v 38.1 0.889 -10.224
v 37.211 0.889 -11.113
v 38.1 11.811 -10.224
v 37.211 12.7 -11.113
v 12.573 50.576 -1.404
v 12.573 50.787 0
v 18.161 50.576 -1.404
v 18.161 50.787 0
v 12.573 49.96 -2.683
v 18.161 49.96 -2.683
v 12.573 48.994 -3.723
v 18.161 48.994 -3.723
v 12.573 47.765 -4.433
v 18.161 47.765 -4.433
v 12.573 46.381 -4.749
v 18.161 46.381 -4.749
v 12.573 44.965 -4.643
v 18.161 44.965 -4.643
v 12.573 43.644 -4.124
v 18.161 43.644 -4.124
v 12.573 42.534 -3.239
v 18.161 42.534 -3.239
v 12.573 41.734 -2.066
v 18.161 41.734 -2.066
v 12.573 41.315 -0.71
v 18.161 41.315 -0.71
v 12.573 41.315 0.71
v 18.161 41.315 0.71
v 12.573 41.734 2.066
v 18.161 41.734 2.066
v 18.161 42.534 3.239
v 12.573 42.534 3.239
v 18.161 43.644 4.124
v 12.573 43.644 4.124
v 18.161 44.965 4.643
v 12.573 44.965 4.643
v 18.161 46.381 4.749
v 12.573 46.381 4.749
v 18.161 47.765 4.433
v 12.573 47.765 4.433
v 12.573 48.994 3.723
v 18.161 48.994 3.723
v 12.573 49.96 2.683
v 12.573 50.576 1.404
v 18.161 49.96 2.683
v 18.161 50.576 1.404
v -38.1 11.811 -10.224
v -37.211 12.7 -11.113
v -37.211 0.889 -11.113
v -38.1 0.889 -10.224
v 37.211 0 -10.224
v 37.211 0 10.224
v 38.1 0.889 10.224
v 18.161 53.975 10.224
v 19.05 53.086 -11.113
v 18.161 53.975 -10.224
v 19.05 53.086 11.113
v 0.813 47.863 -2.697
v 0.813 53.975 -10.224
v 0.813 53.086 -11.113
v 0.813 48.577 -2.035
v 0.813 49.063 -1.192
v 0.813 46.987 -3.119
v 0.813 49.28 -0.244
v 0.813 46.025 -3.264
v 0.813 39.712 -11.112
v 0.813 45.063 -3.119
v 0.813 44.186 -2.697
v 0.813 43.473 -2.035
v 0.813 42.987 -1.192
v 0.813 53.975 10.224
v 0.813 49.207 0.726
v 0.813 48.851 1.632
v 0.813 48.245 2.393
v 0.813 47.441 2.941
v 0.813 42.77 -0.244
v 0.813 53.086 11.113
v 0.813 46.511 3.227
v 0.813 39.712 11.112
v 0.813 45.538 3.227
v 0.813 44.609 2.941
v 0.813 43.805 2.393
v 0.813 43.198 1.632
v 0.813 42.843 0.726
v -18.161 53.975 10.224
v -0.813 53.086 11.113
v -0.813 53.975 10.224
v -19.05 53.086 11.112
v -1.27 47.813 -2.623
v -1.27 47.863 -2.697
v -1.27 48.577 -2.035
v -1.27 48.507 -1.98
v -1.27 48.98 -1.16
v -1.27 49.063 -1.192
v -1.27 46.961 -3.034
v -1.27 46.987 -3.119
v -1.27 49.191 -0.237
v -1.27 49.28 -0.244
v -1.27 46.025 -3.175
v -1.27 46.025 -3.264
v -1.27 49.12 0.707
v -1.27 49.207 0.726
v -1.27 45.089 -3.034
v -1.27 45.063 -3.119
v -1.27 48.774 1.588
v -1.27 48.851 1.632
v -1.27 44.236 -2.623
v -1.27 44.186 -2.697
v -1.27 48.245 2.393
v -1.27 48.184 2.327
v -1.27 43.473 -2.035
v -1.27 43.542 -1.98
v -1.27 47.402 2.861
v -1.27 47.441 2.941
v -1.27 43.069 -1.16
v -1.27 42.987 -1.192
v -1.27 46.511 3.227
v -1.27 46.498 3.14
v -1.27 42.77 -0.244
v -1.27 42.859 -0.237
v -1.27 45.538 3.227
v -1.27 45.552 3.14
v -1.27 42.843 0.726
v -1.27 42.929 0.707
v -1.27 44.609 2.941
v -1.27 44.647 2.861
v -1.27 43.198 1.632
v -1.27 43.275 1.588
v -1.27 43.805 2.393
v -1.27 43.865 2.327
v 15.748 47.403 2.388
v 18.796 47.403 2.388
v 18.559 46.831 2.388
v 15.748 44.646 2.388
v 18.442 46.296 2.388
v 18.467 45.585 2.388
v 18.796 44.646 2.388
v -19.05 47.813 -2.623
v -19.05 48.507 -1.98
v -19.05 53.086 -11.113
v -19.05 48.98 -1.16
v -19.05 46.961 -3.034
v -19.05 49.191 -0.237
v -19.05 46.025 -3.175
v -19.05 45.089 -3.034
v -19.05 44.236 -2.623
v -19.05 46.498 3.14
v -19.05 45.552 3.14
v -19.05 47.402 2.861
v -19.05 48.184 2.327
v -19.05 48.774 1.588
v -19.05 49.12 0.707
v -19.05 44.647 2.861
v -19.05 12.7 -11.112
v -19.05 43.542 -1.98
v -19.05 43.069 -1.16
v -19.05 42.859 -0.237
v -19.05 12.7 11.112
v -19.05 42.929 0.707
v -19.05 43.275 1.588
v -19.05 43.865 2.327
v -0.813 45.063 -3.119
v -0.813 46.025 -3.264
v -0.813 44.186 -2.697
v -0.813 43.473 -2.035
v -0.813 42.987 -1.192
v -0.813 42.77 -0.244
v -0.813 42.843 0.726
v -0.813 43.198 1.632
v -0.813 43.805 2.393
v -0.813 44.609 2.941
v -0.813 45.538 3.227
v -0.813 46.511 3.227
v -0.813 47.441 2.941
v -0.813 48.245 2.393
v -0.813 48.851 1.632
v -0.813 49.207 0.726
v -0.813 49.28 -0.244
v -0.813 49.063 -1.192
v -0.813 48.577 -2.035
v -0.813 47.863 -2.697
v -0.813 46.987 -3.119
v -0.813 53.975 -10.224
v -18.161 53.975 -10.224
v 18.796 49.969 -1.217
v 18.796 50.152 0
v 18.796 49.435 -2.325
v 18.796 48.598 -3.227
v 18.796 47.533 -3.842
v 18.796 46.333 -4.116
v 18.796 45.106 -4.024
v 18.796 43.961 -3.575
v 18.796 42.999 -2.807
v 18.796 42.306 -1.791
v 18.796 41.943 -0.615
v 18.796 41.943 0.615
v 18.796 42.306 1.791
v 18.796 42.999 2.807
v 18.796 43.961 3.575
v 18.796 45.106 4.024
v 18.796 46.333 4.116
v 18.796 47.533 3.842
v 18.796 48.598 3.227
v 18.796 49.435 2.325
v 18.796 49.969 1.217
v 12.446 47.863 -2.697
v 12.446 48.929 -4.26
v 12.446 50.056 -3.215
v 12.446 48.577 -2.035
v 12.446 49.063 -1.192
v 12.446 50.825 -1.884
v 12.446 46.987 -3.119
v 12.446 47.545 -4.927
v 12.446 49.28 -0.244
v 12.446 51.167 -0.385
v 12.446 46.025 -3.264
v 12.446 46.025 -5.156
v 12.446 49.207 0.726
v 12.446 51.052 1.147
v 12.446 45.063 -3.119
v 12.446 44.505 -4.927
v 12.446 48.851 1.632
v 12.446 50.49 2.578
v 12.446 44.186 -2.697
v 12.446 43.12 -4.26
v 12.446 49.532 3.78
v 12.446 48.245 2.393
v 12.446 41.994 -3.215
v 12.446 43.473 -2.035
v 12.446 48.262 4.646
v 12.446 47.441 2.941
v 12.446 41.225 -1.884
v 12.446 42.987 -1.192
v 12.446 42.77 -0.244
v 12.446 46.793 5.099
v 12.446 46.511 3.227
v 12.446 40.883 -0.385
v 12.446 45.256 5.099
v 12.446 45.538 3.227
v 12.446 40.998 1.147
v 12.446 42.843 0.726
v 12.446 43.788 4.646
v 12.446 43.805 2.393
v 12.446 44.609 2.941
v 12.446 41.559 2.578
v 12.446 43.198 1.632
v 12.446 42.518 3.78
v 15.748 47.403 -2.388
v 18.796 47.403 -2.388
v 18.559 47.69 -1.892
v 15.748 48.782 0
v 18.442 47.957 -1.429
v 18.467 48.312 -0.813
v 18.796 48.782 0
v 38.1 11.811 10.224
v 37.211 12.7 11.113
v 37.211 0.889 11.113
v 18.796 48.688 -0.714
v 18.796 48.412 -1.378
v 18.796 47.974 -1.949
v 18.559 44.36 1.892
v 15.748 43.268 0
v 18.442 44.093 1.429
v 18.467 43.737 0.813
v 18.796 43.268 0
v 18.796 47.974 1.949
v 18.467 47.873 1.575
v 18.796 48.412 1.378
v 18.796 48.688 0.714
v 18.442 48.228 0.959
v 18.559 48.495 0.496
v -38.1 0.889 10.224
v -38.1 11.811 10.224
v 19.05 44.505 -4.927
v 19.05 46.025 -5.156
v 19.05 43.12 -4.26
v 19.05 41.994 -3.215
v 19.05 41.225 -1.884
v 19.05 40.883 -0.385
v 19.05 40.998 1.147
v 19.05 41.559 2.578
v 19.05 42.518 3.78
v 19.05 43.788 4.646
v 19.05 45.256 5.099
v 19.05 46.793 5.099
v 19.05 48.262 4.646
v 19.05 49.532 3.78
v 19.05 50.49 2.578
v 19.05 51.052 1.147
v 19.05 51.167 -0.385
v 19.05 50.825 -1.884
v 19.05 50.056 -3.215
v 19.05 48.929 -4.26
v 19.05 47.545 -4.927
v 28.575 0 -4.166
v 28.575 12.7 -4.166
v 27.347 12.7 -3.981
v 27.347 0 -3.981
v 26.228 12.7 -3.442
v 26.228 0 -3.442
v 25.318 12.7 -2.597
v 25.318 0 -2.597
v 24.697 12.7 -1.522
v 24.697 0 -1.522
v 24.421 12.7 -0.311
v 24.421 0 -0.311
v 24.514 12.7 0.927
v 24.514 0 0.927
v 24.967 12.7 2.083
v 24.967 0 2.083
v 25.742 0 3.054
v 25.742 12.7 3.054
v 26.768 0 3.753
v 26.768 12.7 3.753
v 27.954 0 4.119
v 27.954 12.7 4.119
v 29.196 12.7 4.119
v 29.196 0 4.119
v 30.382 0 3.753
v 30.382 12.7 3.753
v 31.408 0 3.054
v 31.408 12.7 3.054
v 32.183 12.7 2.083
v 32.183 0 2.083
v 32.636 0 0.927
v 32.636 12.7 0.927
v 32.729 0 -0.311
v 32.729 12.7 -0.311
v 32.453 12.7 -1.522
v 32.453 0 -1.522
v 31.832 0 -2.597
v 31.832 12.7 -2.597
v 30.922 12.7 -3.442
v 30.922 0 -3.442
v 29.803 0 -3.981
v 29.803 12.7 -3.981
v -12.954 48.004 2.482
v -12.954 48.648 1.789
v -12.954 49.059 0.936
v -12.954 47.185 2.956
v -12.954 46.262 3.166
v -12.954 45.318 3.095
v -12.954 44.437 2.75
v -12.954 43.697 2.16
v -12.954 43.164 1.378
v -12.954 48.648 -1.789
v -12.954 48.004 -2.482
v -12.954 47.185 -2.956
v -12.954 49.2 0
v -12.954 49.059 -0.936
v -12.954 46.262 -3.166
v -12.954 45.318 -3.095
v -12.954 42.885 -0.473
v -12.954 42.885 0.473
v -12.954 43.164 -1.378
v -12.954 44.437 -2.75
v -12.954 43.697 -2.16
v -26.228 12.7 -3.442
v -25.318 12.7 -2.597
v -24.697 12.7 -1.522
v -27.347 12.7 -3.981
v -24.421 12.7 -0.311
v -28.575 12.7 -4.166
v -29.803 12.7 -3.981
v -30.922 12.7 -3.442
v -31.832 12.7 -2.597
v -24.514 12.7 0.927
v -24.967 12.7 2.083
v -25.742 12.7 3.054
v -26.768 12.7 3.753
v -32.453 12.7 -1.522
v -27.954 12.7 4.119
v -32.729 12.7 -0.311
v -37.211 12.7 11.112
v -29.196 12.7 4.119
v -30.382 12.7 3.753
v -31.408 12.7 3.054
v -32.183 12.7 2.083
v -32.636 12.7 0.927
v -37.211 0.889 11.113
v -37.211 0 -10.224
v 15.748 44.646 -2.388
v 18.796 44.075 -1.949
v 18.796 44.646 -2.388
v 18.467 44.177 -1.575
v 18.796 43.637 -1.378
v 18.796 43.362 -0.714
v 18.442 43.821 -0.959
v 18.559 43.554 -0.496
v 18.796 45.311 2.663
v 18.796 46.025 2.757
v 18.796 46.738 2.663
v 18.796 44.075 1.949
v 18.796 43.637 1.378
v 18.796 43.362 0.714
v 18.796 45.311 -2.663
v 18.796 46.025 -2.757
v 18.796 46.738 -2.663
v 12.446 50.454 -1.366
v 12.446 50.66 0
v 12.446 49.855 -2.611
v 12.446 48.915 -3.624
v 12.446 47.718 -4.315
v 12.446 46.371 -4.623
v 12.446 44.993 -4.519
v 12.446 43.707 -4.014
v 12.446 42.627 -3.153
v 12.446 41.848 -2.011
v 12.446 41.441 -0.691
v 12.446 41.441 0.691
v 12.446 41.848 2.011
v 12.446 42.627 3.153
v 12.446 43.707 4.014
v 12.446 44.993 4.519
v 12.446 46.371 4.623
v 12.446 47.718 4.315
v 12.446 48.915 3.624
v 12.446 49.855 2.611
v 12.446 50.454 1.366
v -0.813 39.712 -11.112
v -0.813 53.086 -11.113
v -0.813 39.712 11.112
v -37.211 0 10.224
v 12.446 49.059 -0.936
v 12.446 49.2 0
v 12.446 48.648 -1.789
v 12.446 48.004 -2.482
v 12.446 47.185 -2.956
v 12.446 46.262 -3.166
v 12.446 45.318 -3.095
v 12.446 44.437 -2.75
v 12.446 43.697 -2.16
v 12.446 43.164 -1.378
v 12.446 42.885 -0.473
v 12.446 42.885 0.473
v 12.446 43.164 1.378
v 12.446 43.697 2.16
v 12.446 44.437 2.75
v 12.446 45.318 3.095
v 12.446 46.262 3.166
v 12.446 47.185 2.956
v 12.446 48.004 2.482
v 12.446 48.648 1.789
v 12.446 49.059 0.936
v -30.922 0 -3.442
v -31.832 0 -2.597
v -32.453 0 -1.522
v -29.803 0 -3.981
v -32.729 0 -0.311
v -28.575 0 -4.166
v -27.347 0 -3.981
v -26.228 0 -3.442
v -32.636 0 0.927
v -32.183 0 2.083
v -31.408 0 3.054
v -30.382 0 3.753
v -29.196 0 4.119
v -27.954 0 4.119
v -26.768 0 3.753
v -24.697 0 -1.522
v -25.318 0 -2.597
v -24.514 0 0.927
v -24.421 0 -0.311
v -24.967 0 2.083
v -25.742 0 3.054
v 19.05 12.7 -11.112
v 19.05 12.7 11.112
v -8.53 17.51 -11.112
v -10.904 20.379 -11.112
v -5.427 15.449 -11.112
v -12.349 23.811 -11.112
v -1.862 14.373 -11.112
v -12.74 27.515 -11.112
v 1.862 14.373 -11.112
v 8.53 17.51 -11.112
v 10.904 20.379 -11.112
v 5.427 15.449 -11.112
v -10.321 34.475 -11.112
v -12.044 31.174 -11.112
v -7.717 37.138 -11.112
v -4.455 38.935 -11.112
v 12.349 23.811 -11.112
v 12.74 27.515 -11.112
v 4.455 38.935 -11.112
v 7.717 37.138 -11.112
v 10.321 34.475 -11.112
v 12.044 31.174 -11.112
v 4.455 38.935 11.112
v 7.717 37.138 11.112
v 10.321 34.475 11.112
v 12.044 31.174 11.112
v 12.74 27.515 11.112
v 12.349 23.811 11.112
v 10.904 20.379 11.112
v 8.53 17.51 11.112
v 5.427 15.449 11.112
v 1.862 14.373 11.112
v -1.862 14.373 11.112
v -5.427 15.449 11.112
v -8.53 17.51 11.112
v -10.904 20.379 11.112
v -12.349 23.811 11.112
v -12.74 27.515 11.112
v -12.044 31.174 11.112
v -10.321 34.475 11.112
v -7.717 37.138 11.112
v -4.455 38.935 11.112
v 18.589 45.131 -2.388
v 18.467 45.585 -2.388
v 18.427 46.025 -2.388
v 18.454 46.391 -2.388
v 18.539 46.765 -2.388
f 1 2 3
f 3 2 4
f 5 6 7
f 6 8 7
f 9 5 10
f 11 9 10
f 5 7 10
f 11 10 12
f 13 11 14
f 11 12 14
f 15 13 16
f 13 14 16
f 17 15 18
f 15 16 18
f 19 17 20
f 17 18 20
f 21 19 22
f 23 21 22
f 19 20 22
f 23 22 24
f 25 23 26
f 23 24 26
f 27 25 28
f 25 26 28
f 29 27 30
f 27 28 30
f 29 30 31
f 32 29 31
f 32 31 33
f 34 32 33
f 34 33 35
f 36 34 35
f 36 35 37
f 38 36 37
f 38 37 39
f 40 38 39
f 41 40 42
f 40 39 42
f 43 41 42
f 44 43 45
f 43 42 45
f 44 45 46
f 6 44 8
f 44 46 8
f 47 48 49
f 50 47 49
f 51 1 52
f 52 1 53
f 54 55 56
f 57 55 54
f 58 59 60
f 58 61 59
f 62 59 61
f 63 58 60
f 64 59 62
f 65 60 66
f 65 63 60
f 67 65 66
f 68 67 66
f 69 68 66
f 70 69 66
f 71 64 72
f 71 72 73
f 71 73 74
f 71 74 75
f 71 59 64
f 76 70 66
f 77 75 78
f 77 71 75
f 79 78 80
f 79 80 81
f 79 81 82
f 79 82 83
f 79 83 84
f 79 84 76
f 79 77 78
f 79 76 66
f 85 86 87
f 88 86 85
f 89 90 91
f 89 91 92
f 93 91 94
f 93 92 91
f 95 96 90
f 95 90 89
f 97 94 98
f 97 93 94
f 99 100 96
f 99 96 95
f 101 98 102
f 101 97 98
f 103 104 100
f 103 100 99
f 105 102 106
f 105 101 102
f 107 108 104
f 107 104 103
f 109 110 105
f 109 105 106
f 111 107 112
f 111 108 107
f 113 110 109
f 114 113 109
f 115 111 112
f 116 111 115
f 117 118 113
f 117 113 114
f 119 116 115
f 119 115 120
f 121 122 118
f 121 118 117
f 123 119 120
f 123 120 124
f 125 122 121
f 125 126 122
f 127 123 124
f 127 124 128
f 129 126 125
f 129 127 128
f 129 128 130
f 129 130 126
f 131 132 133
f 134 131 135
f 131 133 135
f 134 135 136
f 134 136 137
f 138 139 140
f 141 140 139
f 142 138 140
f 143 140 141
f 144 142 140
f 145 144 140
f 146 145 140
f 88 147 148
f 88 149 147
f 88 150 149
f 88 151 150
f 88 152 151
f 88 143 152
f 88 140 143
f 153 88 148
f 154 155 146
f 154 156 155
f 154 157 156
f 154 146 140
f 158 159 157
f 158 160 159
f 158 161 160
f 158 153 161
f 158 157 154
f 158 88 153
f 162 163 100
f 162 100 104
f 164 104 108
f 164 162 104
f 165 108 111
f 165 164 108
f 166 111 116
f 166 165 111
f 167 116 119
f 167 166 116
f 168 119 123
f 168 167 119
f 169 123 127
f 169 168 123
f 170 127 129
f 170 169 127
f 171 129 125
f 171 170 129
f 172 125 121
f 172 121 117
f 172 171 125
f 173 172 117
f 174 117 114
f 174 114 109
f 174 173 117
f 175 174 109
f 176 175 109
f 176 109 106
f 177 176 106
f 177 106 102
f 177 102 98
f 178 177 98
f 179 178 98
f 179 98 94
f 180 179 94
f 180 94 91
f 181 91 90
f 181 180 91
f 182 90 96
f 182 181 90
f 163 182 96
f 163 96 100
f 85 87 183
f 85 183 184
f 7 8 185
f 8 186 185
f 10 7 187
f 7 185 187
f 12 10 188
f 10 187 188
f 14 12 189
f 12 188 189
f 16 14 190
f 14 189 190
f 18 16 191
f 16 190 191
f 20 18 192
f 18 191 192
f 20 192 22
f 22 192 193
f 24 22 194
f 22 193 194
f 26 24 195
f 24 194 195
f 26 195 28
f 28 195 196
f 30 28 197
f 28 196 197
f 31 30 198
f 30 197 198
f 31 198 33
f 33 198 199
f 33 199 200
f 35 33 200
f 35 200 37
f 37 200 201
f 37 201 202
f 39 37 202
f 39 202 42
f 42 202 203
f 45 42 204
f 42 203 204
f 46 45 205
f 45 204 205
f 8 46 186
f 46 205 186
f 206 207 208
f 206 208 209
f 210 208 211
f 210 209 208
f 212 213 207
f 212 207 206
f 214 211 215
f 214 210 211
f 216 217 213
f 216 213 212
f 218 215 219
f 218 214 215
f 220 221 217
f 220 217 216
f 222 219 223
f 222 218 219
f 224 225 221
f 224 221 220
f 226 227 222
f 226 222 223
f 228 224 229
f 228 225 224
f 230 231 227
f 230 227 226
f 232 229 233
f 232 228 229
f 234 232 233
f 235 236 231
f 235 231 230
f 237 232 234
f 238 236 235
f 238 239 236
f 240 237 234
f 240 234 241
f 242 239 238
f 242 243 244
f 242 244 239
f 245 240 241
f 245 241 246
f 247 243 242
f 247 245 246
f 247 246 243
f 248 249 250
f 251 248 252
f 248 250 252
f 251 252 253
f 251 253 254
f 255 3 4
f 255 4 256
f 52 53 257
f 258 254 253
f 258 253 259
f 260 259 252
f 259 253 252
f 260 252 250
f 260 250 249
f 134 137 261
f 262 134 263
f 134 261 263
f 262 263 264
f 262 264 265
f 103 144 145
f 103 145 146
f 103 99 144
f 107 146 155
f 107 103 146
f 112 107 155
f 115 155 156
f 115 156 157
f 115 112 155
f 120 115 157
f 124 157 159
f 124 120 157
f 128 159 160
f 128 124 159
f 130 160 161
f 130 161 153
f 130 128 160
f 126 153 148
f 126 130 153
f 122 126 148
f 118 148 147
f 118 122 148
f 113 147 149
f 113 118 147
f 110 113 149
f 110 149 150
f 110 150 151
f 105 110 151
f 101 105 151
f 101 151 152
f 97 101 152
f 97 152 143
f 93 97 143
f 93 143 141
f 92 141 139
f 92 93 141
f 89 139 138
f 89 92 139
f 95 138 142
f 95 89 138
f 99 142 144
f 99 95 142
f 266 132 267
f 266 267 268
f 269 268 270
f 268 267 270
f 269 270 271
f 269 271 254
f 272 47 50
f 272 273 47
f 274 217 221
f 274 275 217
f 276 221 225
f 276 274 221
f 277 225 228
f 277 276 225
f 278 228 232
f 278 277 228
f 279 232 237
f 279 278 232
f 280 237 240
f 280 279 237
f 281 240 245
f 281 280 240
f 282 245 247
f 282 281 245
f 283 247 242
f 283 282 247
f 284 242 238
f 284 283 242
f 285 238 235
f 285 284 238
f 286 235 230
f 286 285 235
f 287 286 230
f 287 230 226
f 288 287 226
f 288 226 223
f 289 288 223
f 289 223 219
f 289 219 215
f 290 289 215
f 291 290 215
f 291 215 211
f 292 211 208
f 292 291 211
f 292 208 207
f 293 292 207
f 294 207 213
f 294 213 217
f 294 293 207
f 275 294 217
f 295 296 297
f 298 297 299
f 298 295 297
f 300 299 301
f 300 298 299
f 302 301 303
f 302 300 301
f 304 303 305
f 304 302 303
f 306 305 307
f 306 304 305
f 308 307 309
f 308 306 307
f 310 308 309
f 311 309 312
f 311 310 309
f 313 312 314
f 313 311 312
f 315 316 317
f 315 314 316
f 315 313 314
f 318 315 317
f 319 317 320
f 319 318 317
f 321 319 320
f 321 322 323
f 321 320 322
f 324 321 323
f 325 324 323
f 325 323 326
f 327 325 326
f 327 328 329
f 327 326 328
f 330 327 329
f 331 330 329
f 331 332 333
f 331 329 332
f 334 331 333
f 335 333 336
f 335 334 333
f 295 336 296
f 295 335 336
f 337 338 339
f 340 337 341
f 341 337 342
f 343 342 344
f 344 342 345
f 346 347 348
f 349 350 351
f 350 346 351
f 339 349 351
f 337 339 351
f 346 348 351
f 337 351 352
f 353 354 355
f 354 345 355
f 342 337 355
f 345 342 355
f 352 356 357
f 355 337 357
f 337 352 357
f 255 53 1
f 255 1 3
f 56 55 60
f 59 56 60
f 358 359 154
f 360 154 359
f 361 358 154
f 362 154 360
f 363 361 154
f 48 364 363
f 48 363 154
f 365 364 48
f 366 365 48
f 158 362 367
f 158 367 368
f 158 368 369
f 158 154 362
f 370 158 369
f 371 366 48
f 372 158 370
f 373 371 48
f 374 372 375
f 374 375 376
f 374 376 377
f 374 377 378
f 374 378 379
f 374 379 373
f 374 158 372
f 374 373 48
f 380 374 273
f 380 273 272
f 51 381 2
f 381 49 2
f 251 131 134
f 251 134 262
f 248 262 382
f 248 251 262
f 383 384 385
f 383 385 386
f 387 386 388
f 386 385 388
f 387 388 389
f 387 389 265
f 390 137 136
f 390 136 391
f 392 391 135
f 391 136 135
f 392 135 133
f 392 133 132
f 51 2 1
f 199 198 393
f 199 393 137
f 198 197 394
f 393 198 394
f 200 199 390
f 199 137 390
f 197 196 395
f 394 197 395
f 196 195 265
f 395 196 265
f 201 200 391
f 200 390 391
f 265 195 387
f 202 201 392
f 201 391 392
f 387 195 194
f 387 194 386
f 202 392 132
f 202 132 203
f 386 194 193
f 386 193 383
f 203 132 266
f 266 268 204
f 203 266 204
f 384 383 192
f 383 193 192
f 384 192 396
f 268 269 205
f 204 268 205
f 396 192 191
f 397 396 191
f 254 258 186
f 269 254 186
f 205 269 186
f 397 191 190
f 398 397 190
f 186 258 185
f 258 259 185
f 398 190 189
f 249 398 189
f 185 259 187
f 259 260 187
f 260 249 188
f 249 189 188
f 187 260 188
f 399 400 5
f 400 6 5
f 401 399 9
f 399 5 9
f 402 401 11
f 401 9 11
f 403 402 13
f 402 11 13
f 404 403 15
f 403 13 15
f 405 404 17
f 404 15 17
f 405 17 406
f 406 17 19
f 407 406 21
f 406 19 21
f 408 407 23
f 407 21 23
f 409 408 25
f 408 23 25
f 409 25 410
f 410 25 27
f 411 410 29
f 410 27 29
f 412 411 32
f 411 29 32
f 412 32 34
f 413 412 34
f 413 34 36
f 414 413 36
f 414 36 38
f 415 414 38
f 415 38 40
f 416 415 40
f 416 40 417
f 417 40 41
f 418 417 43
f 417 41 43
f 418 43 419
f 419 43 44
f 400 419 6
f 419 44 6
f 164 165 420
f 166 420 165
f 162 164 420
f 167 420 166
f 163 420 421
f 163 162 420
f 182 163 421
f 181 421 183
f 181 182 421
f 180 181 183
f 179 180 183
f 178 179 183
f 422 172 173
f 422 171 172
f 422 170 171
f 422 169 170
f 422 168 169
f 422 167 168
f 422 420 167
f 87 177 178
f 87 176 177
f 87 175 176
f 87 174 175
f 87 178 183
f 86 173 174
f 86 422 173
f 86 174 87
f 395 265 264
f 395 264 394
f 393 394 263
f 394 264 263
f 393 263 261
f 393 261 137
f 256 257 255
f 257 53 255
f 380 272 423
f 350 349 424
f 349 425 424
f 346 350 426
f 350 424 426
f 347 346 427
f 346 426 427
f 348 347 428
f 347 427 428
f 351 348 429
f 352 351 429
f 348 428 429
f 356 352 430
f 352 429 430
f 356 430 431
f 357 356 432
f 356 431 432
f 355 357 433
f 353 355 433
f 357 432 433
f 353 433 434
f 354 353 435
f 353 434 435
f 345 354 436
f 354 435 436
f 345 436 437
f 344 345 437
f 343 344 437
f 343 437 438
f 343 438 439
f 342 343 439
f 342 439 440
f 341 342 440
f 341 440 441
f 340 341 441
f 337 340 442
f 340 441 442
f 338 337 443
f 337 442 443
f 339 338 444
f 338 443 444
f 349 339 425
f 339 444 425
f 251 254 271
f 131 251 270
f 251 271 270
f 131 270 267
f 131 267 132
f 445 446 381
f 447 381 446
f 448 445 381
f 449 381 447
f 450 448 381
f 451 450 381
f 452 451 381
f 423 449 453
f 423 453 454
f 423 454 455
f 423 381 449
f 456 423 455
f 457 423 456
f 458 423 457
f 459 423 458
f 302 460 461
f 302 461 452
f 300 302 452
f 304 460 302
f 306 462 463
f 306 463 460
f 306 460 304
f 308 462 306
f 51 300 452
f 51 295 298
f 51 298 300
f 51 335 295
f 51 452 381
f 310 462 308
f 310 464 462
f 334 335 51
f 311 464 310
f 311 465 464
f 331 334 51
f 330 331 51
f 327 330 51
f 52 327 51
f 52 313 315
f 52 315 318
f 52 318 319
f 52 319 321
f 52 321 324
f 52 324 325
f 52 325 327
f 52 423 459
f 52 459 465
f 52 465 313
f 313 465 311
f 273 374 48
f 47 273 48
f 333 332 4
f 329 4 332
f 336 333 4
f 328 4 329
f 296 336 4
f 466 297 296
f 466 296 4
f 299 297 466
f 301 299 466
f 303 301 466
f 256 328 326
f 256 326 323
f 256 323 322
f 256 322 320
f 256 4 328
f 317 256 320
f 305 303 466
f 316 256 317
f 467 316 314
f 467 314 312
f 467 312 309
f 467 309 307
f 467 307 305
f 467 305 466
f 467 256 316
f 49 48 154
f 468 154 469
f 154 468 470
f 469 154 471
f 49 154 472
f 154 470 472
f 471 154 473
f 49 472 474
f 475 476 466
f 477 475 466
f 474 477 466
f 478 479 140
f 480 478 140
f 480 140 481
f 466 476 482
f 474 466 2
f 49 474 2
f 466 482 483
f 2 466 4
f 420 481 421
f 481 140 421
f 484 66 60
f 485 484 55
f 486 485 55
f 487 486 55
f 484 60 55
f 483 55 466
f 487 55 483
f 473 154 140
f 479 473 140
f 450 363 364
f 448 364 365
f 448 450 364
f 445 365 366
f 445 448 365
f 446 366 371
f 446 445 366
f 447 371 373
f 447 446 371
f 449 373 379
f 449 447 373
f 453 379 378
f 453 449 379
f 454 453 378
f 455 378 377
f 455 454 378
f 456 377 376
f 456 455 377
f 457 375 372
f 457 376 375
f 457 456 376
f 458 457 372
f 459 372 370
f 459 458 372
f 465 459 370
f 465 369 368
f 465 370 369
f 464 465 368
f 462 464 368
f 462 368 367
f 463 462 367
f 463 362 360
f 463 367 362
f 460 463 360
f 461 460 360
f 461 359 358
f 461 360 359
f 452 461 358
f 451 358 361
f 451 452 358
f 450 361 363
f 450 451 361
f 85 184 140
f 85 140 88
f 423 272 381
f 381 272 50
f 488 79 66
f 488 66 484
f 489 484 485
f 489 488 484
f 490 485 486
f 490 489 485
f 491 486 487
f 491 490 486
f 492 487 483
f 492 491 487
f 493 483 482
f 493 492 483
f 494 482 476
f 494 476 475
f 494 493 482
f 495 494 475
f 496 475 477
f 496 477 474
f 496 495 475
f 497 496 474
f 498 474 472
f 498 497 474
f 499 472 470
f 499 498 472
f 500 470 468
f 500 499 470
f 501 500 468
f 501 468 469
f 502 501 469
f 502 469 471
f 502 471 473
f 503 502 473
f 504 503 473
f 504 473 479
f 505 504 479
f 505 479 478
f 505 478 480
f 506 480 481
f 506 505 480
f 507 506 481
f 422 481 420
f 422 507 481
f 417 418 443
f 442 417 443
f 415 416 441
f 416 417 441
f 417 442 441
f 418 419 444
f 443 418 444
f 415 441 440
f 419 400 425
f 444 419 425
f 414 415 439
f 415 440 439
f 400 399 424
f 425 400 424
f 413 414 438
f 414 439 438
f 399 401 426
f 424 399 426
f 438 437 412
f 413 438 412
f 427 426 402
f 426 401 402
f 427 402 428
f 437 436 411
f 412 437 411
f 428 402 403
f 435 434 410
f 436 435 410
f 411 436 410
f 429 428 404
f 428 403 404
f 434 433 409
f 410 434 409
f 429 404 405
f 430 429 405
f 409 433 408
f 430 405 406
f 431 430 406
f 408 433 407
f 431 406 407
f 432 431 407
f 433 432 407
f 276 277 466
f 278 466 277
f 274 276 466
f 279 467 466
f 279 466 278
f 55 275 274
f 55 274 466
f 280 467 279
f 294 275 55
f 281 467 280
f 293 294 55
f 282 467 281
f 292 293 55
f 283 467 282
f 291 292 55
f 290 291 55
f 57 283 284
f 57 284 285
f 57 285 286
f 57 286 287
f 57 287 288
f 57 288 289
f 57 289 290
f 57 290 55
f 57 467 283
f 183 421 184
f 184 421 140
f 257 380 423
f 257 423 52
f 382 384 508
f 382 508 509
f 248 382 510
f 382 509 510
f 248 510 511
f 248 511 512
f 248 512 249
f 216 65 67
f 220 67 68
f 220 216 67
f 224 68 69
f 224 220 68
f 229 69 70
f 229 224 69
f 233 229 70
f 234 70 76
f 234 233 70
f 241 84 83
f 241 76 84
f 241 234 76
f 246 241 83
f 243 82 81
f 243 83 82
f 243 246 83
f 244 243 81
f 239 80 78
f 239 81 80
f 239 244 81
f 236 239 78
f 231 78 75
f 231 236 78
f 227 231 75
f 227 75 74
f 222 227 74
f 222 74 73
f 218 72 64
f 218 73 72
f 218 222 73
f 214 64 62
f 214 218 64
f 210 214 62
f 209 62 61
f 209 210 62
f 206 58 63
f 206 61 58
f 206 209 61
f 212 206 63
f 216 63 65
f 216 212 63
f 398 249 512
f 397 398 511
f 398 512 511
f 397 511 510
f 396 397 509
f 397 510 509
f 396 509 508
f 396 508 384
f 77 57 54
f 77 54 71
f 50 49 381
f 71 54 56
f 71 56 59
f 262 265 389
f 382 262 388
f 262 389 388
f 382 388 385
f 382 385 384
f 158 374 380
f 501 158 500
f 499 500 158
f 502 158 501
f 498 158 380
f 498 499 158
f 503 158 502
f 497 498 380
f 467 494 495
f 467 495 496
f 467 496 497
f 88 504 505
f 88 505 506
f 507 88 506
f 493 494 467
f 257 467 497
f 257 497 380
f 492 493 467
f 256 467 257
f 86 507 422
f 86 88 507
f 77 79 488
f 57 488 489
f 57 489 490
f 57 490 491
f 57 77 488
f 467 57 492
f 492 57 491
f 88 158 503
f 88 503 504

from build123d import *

# Parameters (mm, degrees)
BOSS_EXTRUDE1_DEPTH = 11.1125
CHAMFER1_SIZE       = 0.889
SKETCH2_R           = 4.1656
CUT_EXTRUDE1_DEPTH  = 67.995509411
CUT_EXTRUDE4_DEPTH  = 3.048


with BuildPart() as part:
    # Sketch1 → Boss-Extrude1 (new, symmetric)
    with BuildSketch(Plane.XY):
        with BuildLine():
            Line((-38.1, 0), (38.1, 0))
            Line((38.1, 0), (38.1, 12.7))
            Line((38.1, 12.7), (19.05, 12.7))
            Line((19.05, 12.7), (19.05, 53.975))
            Line((19.05, 53.975), (0.8128, 53.975))
            Line((0.8128, 53.975), (0.8128, 39.712367654))
            ThreePointArc((0.8128, 39.712367654), (0, 14.2367), (-0.8128, 39.712367654))
            Line((-0.8128, 39.712367654), (-0.8128, 53.975))
            Line((-0.8128, 53.975), (-19.05, 53.975))
            Line((-19.05, 53.975), (-19.05, 12.7))
            Line((-19.05, 12.7), (-38.1, 12.7))
            Line((-38.1, 12.7), (-38.1, 0))
        make_face()
    extrude(amount=BOSS_EXTRUDE1_DEPTH, both=True)

    # Chamfer1
    chamfer1_edges = [part.edges().sort_by_distance(p)[0] for p in [
        (38.1, 6.35, 11.1125),
        (-9.9314, 53.975, -11.1125),
        (9.9314, 53.975, -11.1125),
        (38.1, 6.35, -11.1125),
        (0, 0, -11.1125),
        (-38.1, 6.35, -11.1125),
        (9.9314, 53.975, 11.1125),
        (-38.1, 12.7, 0),
        (-19.05, 53.975, 0),
        (19.05, 53.975, 0),
        (38.1, 12.7, 0),
        (38.1, 0, 0),
        (-38.1, 0, 0),
        (-9.9314, 53.975, 11.1125),
        (-38.1, 6.35, 11.1125),
        (0, 0, 11.1125),
    ]]
    chamfer(chamfer1_edges, length=CHAMFER1_SIZE)

    # Sketch2 → Cut-Extrude1 (cut, through all)
    with BuildSketch(Plane(origin=(0, 0, 0), x_dir=(1, 0, 0), z_dir=(0, 1, 0))):
        with Locations(Location((-28.575, 0, 0), (0, 0, 90))):
            Circle(SKETCH2_R)
        with Locations(Location((28.575, 0, 0), (0, 0, 90))):
            Circle(SKETCH2_R)
    extrude(amount=CUT_EXTRUDE1_DEPTH, mode=Mode.SUBTRACT)

    # Sketch3 → Cut-Revolve1 (revolve, cut)
    with BuildSketch(Plane.XY, mode=Mode.PRIVATE) as cut_revolve1_sk:
        Polygon((-19.05, 46.0248), (-19.05, 49.1998), (-1.27, 49.1998), (-1.27, 49.2887), (12.446, 49.2887), (12.446, 51.181), (19.05, 51.181), (19.05, 46.0248), align=None)
    revolve(cut_revolve1_sk.sketch.rotate(Axis((19.05, 46.0248, 0), (-1, 0, 0)), 90), axis=Axis((19.05, 46.0248, 0), (-1, 0, 0)), mode=Mode.SUBTRACT)


with BuildPart() as body_2:
    # Sketch4 → Revolve1 (revolve)
    with BuildSketch(Plane.XY):
        Polygon((-12.954, 46.0248), (-12.954, 49.1998), (12.446, 49.1998), (12.446, 50.6603), (12.573, 50.7873), (18.161, 50.7873), (18.796, 50.1523), (18.796, 46.0248), align=None)
    revolve(axis=Axis((18.796, 46.0248, 0), (-1, 0, 0)))

    # Sketch5 → Cut-Extrude4 (cut)
    with BuildSketch(Plane(origin=(18.796, 0, 0), x_dir=(0, 0, -1), z_dir=(1, 0, 0))):
        Polygon((0, 48.781763005), (-2.3876, 47.403281503), (-2.3876, 44.646318497), (0, 43.267836995), (2.3876, 44.646318497), (2.3876, 47.403281503), align=None)
    extrude(amount=-CUT_EXTRUDE4_DEPTH, mode=Mode.SUBTRACT)

    # Cut-Extrude5 cone 1 section (through the dimple's axis) → Cut-Extrude5 (revolve, cut)
    with BuildSketch(Plane(origin=(18.796, 46.0248, 0), x_dir=(0, 0, -1), z_dir=(0, 1, 0))):
        Polygon((0, 0), (2.756963005, 0), (0, 2.756963005), align=None)
    revolve(axis=Axis((18.796, 46.0248, 0), (-1, 0, 0)), mode=Mode.SUBTRACT)


solid = Compound([part.part, body_2.part])
